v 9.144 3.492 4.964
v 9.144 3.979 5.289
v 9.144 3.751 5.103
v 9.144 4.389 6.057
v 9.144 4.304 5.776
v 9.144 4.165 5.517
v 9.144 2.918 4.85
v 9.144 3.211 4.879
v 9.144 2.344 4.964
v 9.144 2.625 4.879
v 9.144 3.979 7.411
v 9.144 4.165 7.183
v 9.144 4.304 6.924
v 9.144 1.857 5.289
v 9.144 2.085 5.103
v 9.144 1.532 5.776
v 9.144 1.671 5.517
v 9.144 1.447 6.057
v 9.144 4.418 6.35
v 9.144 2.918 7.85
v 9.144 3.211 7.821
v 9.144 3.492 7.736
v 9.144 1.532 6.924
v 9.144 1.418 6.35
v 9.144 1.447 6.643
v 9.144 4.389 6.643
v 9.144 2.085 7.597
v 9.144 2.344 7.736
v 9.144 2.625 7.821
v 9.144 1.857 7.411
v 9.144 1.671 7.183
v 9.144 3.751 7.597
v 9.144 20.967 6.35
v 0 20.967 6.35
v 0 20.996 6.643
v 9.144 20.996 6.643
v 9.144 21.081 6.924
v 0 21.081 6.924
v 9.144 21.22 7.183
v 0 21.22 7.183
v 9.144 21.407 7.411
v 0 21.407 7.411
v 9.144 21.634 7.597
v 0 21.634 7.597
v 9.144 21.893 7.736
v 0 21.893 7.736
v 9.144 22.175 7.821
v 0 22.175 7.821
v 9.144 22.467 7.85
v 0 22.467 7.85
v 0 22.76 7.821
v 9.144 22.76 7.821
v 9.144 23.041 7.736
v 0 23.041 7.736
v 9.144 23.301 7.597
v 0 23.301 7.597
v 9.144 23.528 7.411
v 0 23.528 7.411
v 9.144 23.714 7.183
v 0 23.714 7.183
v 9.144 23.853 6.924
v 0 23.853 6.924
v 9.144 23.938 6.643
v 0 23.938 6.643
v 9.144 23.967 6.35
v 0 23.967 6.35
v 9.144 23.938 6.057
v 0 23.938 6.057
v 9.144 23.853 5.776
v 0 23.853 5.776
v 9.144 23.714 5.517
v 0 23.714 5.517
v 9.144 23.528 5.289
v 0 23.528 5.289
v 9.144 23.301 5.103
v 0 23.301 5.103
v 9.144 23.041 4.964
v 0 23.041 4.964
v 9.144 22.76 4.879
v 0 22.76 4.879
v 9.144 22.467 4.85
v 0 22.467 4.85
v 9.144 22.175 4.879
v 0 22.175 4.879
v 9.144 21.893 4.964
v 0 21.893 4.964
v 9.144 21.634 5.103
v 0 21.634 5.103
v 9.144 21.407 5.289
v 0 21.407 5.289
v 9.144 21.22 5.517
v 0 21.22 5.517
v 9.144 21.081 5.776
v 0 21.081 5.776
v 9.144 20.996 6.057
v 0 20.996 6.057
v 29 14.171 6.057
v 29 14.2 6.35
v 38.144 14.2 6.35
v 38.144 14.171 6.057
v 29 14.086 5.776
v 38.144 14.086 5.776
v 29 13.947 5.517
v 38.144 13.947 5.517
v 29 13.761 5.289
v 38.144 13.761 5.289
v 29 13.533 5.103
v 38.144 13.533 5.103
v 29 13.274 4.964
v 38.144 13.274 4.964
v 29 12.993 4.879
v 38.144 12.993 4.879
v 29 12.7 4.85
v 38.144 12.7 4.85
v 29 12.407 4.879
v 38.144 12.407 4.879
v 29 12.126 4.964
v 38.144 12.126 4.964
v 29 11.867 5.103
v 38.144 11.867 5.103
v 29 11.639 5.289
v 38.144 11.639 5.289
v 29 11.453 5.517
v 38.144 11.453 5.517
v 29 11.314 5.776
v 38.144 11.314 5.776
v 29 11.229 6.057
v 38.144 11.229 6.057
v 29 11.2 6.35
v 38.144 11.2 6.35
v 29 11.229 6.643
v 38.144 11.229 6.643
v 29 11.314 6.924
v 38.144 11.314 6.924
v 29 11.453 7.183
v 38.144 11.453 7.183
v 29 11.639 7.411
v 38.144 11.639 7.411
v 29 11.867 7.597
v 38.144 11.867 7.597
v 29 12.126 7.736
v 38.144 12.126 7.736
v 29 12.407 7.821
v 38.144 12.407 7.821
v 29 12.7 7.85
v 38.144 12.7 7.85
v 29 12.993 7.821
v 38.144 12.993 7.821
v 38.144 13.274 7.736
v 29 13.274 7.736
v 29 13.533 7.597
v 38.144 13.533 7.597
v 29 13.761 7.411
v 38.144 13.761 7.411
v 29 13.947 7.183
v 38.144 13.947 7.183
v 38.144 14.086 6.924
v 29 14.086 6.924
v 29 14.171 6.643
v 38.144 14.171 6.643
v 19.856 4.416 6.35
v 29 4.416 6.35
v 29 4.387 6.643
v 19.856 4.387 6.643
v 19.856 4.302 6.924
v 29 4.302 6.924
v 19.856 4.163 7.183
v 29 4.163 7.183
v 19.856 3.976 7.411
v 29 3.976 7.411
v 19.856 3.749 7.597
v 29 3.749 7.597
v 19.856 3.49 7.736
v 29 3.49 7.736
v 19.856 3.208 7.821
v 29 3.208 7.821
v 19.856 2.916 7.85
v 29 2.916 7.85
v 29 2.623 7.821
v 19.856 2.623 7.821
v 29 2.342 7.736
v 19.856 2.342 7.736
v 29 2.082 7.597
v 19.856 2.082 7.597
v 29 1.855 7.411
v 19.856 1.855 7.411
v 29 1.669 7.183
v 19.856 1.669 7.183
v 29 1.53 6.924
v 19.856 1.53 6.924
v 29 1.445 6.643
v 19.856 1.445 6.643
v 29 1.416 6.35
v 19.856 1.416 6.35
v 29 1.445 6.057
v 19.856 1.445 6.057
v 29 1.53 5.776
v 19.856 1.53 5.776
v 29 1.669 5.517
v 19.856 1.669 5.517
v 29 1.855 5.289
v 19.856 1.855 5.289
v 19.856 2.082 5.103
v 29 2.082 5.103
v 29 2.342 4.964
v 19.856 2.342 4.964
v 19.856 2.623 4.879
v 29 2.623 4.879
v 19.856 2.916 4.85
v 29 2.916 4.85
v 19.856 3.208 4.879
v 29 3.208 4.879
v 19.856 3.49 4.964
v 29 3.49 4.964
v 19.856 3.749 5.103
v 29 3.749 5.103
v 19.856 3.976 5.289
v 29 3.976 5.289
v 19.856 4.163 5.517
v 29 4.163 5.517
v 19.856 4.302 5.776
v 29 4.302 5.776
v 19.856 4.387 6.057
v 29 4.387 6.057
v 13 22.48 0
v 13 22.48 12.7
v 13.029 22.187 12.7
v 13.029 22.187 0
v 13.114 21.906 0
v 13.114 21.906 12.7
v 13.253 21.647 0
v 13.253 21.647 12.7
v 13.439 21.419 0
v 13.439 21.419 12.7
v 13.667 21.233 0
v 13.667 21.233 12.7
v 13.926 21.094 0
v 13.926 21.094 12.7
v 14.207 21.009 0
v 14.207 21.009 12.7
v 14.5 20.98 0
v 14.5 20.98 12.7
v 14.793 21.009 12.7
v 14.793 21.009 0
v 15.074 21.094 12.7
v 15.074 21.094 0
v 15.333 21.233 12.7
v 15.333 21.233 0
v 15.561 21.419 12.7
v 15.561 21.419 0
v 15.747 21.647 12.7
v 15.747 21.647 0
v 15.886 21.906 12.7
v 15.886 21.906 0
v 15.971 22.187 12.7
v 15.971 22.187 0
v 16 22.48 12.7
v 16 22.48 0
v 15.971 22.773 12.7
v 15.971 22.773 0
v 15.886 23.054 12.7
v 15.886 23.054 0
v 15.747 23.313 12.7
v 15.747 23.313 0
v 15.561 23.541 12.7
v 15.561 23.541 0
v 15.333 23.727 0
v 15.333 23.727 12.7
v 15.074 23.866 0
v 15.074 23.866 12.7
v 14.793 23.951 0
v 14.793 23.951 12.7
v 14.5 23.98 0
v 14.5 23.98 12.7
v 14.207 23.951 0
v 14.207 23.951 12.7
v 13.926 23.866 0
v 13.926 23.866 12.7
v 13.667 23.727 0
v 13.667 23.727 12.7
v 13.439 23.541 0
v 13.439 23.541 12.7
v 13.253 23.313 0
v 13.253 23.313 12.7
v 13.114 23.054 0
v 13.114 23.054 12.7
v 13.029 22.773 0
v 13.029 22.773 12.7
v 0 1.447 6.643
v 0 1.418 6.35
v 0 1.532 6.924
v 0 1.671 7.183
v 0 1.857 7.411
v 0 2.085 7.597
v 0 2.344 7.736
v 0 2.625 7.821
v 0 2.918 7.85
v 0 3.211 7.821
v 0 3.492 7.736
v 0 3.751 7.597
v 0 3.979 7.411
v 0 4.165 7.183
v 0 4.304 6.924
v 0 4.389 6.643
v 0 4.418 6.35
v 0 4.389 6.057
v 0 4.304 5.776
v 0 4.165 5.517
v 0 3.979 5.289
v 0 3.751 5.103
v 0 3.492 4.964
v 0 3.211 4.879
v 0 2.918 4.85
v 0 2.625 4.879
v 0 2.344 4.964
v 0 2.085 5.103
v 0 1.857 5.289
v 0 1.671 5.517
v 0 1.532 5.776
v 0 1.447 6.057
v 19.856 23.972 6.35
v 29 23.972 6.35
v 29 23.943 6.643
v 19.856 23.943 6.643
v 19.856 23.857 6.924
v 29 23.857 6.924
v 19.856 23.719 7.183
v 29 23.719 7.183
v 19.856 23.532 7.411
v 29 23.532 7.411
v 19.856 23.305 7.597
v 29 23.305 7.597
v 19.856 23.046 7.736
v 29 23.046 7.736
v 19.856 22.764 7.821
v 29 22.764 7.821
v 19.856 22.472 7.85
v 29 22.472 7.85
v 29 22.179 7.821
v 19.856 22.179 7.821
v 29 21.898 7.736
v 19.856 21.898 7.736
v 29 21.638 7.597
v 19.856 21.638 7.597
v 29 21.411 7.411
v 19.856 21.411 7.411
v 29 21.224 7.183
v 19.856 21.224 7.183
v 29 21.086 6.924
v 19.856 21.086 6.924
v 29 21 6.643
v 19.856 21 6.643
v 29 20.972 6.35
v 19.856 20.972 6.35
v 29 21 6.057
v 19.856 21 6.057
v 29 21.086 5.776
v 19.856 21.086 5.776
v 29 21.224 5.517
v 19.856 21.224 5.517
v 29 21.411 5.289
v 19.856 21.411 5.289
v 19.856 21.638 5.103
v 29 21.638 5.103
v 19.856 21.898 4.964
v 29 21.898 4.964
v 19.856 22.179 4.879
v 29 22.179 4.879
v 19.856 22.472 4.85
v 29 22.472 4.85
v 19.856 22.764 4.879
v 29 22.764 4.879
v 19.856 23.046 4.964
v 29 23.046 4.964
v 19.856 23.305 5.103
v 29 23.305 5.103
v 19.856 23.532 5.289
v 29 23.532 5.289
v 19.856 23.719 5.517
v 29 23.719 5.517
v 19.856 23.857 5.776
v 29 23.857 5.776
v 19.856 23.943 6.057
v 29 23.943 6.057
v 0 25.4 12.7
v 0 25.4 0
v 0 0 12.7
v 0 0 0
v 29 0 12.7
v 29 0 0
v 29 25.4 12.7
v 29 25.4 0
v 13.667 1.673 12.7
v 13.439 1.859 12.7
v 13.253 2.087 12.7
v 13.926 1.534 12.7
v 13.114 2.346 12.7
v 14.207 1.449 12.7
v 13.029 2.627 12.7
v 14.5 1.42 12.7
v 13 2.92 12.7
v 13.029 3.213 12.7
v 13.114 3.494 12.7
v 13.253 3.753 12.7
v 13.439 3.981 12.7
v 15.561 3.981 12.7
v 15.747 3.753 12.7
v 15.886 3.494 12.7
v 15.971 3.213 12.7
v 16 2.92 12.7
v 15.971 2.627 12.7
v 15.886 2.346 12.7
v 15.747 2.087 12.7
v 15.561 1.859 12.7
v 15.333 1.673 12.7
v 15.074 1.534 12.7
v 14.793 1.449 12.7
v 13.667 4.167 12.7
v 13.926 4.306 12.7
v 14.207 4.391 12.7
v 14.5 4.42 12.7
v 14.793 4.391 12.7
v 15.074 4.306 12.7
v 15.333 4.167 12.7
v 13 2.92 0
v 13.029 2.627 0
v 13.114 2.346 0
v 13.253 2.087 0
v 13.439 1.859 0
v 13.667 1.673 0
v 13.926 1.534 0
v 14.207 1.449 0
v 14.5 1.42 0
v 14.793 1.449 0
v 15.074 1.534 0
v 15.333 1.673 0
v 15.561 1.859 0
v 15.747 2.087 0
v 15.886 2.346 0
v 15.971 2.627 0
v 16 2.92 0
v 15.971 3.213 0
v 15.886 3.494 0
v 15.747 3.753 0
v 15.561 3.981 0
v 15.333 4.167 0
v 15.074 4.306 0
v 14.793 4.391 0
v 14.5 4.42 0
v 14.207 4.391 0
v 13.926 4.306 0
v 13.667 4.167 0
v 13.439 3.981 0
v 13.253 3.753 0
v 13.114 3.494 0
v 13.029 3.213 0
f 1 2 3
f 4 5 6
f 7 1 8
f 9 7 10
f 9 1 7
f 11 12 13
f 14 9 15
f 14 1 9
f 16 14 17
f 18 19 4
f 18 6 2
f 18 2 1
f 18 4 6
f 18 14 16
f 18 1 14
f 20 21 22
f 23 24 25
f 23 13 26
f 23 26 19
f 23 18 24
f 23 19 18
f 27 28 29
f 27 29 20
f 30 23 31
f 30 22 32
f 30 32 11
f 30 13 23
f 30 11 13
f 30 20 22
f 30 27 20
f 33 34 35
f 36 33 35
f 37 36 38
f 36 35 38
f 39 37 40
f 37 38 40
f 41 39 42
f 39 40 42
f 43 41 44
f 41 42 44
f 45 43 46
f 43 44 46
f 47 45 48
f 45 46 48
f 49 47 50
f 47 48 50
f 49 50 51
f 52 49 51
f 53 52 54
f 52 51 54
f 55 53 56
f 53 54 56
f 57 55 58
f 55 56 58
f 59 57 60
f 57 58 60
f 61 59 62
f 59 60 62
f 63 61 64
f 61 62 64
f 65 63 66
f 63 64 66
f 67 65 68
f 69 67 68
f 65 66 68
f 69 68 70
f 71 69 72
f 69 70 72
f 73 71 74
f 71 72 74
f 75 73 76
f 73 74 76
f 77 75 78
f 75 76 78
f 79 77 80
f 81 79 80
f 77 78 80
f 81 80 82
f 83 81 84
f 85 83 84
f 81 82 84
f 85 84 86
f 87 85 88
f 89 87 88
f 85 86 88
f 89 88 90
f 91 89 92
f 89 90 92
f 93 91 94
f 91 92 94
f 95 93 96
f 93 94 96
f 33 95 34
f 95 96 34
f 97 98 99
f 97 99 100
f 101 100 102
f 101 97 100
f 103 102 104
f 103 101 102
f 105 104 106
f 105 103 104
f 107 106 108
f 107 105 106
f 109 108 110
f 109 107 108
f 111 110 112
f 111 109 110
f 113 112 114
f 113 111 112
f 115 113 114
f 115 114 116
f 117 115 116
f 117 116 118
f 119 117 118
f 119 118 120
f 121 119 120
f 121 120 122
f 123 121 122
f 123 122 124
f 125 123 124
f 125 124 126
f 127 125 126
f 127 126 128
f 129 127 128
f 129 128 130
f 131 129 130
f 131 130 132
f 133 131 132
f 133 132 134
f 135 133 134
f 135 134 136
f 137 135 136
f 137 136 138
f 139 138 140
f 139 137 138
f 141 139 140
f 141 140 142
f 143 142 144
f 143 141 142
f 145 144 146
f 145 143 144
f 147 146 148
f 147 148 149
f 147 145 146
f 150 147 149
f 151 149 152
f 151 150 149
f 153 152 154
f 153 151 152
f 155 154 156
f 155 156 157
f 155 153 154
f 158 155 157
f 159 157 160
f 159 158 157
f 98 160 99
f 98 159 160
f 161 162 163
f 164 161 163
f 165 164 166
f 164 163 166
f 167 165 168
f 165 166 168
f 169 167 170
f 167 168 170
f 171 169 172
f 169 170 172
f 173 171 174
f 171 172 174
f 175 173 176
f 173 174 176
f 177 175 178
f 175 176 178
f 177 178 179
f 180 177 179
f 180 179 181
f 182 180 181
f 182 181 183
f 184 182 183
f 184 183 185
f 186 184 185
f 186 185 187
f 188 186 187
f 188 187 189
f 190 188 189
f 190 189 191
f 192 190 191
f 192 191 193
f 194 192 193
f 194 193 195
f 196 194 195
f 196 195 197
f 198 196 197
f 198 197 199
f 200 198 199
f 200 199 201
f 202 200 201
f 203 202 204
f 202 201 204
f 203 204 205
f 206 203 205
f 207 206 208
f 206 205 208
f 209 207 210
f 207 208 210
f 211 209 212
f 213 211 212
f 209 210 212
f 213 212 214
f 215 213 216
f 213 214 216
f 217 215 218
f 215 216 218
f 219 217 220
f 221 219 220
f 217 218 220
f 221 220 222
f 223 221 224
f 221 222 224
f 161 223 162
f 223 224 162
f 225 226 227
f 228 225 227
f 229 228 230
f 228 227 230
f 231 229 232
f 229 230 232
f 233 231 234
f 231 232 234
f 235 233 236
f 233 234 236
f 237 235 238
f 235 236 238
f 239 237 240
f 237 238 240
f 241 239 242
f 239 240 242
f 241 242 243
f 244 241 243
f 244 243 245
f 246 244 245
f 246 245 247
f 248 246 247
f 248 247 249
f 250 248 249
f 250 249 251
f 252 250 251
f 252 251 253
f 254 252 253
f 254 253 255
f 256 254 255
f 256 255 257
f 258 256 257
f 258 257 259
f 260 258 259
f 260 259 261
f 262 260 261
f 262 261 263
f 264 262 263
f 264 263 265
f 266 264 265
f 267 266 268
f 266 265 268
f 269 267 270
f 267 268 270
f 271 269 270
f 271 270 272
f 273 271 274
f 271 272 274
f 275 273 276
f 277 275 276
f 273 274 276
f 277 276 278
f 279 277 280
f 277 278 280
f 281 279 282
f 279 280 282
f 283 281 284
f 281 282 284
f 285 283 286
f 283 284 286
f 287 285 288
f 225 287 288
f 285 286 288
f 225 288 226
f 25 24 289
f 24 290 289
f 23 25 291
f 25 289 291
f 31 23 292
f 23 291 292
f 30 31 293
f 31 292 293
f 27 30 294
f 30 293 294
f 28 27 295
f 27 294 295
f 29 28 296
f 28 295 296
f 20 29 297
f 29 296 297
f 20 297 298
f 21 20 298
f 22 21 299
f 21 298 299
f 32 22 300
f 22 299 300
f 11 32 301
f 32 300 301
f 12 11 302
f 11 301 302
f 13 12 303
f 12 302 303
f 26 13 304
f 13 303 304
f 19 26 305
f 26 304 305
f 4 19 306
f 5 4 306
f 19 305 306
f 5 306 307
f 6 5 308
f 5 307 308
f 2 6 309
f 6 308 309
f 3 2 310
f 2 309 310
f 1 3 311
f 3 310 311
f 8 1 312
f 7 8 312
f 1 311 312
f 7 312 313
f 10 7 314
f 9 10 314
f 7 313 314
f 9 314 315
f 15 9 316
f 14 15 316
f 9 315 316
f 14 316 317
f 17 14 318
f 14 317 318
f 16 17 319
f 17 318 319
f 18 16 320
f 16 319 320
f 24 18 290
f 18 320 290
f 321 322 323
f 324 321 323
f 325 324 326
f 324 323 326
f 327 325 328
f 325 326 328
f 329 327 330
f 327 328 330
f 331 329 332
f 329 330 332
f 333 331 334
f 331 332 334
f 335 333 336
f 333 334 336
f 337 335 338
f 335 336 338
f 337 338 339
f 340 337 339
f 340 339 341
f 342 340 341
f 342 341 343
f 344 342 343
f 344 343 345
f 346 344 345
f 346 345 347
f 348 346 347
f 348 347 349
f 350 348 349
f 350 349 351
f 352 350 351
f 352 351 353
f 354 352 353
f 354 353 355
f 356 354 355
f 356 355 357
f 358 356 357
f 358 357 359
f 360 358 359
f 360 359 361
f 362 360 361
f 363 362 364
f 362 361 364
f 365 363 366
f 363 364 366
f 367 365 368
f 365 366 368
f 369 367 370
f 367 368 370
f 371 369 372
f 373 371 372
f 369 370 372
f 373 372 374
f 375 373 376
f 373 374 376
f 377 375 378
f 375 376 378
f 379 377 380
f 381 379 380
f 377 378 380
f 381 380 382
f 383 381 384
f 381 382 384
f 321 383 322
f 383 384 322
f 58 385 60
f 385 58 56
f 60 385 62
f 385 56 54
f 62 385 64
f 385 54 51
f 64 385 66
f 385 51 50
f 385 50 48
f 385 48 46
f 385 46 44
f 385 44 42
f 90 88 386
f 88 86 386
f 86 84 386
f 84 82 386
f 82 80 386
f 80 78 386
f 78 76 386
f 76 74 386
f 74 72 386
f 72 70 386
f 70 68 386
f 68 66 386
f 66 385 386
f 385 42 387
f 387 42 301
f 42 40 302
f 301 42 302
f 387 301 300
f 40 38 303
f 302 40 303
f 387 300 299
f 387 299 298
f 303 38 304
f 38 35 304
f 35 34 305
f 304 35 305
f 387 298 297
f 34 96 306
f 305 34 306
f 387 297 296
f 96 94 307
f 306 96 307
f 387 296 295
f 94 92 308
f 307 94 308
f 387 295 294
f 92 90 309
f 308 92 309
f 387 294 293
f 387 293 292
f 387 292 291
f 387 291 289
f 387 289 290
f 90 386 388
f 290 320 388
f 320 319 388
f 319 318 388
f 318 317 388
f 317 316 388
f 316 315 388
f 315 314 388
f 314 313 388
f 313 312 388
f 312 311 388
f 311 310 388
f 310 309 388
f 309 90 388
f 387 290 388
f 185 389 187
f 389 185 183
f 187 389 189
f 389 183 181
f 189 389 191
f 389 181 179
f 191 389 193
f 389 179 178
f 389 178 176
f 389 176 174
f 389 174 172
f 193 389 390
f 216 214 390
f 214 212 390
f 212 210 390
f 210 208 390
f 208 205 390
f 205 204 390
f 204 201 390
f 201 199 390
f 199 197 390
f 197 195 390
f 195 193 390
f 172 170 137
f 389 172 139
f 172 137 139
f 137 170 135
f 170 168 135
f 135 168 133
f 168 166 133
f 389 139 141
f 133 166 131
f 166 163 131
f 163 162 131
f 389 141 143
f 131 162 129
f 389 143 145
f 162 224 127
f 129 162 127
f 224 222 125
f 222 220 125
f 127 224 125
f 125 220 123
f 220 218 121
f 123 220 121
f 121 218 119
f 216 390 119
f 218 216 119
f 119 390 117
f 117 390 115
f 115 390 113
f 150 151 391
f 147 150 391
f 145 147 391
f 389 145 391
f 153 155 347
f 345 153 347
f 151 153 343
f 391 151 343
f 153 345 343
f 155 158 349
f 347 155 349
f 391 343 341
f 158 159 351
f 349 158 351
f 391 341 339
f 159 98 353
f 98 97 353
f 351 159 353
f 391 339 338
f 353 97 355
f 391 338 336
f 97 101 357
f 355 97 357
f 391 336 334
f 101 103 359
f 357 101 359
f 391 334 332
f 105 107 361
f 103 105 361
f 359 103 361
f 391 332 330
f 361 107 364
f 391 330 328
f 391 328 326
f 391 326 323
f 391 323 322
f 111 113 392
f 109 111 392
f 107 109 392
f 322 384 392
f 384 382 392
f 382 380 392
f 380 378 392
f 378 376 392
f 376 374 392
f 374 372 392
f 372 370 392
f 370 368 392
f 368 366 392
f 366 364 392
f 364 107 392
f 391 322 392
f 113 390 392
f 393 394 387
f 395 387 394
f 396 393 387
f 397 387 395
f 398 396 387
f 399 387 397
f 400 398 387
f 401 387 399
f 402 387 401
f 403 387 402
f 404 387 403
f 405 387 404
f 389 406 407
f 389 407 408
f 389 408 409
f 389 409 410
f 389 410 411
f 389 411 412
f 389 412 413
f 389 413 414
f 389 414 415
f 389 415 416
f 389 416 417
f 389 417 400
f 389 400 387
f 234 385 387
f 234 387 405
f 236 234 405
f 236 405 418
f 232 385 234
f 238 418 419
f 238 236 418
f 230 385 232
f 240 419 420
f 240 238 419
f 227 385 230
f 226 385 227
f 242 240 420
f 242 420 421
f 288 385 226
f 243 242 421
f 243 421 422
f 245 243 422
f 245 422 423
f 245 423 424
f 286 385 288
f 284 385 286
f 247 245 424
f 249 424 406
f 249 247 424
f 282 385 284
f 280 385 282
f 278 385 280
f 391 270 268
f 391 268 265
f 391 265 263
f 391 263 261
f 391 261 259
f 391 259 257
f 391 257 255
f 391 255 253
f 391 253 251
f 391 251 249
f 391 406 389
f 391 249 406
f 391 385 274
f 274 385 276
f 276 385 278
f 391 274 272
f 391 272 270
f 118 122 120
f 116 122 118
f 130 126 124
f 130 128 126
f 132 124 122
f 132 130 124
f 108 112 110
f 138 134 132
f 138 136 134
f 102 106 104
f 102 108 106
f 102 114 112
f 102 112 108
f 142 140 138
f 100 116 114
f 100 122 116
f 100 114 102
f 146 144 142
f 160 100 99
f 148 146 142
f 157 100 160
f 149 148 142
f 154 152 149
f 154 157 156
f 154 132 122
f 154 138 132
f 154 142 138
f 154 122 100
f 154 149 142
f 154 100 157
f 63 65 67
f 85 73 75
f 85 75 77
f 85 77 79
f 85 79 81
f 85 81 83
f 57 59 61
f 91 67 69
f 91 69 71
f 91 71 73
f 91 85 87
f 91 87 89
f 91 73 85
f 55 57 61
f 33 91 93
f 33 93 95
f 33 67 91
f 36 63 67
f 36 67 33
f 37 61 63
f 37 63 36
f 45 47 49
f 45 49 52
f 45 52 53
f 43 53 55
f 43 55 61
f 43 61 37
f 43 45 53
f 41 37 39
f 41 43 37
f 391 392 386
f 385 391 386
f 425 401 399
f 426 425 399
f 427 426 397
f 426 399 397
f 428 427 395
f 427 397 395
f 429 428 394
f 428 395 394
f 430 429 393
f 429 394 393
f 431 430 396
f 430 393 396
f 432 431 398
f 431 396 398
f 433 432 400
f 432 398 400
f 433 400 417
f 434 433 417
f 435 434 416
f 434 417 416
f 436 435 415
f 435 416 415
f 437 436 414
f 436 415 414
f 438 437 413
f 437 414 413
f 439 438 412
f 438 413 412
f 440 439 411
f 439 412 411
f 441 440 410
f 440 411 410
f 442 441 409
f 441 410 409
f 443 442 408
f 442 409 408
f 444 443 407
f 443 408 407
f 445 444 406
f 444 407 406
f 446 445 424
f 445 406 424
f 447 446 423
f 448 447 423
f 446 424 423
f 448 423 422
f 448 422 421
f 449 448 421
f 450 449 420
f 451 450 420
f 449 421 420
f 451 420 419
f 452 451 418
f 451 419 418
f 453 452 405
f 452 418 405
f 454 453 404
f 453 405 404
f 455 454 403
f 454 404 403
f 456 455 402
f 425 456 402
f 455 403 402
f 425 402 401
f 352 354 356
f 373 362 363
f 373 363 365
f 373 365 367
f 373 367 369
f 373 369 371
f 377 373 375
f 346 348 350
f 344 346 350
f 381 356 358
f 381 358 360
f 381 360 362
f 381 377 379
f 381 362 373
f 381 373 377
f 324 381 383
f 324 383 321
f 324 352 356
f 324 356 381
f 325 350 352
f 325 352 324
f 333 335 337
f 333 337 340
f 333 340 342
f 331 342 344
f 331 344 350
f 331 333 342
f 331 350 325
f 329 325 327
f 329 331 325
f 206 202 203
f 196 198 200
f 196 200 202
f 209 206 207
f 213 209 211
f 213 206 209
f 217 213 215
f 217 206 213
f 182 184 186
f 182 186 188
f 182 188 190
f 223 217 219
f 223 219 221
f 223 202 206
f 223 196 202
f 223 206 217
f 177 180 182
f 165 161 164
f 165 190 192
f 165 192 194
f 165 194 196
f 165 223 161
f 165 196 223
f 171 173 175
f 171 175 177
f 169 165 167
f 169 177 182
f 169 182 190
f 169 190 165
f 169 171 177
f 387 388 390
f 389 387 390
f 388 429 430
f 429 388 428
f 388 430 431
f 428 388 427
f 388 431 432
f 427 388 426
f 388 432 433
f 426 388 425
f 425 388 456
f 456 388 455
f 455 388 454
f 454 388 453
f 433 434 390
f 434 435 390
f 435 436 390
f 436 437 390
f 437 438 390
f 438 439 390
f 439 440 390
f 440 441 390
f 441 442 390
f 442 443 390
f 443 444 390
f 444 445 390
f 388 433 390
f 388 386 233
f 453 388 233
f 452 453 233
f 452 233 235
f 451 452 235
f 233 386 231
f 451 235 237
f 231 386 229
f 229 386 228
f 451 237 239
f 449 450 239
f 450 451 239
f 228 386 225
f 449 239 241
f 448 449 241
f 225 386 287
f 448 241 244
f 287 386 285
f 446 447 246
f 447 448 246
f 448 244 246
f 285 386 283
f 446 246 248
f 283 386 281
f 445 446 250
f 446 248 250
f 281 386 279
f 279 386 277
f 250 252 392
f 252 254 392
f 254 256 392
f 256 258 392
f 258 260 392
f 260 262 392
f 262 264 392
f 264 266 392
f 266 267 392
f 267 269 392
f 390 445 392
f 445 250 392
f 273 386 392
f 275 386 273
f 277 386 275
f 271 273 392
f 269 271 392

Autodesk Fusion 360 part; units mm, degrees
sketch "スケッチ1" plane through (0, 0, 0) normal (0, 0, 1) x (1, 0, 0)
  line L0 (0, 0) -> (29, 0)
  line L1 (29, 0) -> (29, 25.4)
  line L2 (29, 25.4) -> (0, 25.4)
  line L3 (0, 25.4) -> (0, 0)
  dimension "d1" = 29
  dimension "d2" = 25.4
extrude "押し出し2" add sketch "スケッチ1" along normal blind 12.7 makes body 1
sketch "スケッチ2" plane through (0, 0, 12.7) normal (0, 0, 1) x (-1, 0, 0)
  line L0 (0, -25.4) -> (0, 0)
  line L1 (0, 0) -> (-29, 0)
  line L2 (-29, 0) -> (-29, -25.4)
  line L3 (-29, -25.4) -> (0, -25.4)
  line L4 (-29, -12.7) -> (0, -12.7)
  line L5 (-14.5, -12.7) -> (-14.5, -25.4)
  line L6 (-14.5, 0) -> (-14.5, -12.7)
  line L7 (-14.5, -12.7) -> (-14.5, -22.48)
  circle A0 centre (-14.5, -22.48) radius 1.5
  circle A1 centre (-14.5, -2.92) radius 1.5
  dimension "d10" = 9.78
  dimension "d11" = 3
sketch "スケッチ3" plane through (29, 0, 0) normal (1, 0, 0) x (0, 1, 0)
  line L0 (0, 0) -> (25.4, 0)
  line L1 (25.4, 0) -> (25.4, 12.7)
  line L2 (25.4, 12.7) -> (0, 12.7)
  line L3 (0, 12.7) -> (0, 0)
  line L4 (22.4716, 12.7) -> (22.4716, 0)
  line L5 (2.9158, 12.7) -> (2.9158, 0)
  line L6 (0, 6.35) -> (25.4, 6.35)
  circle A0 centre (2.9158, 6.35) radius 1.5
  circle A1 centre (22.4716, 6.35) radius 1.5
  line L7 (12.7, 12.7) -> (12.7, 0)
  circle A2 centre (12.7, 6.35) radius 1.5
  dimension "d12" = 3
  dimension "d13" = 3
  dimension "d14" = 3
sketch "スケッチ4" plane through (0, 0, 0) normal (-1, 0, 0) x (0, -1, 0)
  line L0 (-25.4, 0) -> (0, 0)
  line L1 (0, 0) -> (0, 12.7)
  line L2 (0, 12.7) -> (-25.4, 12.7)
  line L3 (-25.4, 12.7) -> (-25.4, 0)
  line L4 (-22.4672, 12.7) -> (-22.4672, 0)
  line L5 (-2.918, 12.7) -> (-2.918, 0)
  line L6 (-25.4, 6.35) -> (0, 6.35)
  circle A0 centre (-22.4672, 6.35) radius 1.5
  circle A1 centre (-2.918, 6.35) radius 1.5
  dimension "d15" = 3
  dimension "d16" = 3
extrude "押し出し3" cut sketch "スケッチ4" against normal blind 9.144 contours L5 L6 A1 | L5 L6 A1 | L5 L6 A1 | L5 L6 A1 bodies 1
extrude "押し出し4" cut sketch "スケッチ4" against normal blind 9.144 contours L4 L6 A0 | L4 L6 A0 | L4 L6 A0 | L4 L6 A0 bodies 1
extrude "押し出し5" cut sketch "スケッチ2" against normal up to surface (12.7 mm away) contours L6 A1 | L6 A1 bodies 1
extrude "押し出し6" cut sketch "スケッチ2" against normal up to surface (12.7 mm away) contours L5 L7 A0 | L5 L7 A0 bodies 1
extrude "押し出し7" cut sketch "スケッチ3" against normal blind 9.144 contours L5 L6 A0 | L5 L6 A0 | L5 L6 A0 | L5 L6 A0 bodies 1
extrude "押し出し8" cut sketch "スケッチ3" against normal blind 9.144 contours L4 L6 A1 | L4 L6 A1 | L4 L6 A1 | L4 L6 A1 bodies 1
extrude "押し出し9" add sketch "スケッチ3" along normal blind 9.144 contours L6 L7 A2 | L6 L7 A2 | L6 L7 A2 | L6 L7 A2 bodies 1
copy_body "ボディ -> コンポーネント1" bodies 1 removing the originals makes body 2 in component "モーターホルダー1"
extrude "押し出し1" [suppressed]
component "モーターホルダー1" placed x (1, 0, 0) y (0, 1, 0) z (0, 0, 1) at (0, 0, 0)
